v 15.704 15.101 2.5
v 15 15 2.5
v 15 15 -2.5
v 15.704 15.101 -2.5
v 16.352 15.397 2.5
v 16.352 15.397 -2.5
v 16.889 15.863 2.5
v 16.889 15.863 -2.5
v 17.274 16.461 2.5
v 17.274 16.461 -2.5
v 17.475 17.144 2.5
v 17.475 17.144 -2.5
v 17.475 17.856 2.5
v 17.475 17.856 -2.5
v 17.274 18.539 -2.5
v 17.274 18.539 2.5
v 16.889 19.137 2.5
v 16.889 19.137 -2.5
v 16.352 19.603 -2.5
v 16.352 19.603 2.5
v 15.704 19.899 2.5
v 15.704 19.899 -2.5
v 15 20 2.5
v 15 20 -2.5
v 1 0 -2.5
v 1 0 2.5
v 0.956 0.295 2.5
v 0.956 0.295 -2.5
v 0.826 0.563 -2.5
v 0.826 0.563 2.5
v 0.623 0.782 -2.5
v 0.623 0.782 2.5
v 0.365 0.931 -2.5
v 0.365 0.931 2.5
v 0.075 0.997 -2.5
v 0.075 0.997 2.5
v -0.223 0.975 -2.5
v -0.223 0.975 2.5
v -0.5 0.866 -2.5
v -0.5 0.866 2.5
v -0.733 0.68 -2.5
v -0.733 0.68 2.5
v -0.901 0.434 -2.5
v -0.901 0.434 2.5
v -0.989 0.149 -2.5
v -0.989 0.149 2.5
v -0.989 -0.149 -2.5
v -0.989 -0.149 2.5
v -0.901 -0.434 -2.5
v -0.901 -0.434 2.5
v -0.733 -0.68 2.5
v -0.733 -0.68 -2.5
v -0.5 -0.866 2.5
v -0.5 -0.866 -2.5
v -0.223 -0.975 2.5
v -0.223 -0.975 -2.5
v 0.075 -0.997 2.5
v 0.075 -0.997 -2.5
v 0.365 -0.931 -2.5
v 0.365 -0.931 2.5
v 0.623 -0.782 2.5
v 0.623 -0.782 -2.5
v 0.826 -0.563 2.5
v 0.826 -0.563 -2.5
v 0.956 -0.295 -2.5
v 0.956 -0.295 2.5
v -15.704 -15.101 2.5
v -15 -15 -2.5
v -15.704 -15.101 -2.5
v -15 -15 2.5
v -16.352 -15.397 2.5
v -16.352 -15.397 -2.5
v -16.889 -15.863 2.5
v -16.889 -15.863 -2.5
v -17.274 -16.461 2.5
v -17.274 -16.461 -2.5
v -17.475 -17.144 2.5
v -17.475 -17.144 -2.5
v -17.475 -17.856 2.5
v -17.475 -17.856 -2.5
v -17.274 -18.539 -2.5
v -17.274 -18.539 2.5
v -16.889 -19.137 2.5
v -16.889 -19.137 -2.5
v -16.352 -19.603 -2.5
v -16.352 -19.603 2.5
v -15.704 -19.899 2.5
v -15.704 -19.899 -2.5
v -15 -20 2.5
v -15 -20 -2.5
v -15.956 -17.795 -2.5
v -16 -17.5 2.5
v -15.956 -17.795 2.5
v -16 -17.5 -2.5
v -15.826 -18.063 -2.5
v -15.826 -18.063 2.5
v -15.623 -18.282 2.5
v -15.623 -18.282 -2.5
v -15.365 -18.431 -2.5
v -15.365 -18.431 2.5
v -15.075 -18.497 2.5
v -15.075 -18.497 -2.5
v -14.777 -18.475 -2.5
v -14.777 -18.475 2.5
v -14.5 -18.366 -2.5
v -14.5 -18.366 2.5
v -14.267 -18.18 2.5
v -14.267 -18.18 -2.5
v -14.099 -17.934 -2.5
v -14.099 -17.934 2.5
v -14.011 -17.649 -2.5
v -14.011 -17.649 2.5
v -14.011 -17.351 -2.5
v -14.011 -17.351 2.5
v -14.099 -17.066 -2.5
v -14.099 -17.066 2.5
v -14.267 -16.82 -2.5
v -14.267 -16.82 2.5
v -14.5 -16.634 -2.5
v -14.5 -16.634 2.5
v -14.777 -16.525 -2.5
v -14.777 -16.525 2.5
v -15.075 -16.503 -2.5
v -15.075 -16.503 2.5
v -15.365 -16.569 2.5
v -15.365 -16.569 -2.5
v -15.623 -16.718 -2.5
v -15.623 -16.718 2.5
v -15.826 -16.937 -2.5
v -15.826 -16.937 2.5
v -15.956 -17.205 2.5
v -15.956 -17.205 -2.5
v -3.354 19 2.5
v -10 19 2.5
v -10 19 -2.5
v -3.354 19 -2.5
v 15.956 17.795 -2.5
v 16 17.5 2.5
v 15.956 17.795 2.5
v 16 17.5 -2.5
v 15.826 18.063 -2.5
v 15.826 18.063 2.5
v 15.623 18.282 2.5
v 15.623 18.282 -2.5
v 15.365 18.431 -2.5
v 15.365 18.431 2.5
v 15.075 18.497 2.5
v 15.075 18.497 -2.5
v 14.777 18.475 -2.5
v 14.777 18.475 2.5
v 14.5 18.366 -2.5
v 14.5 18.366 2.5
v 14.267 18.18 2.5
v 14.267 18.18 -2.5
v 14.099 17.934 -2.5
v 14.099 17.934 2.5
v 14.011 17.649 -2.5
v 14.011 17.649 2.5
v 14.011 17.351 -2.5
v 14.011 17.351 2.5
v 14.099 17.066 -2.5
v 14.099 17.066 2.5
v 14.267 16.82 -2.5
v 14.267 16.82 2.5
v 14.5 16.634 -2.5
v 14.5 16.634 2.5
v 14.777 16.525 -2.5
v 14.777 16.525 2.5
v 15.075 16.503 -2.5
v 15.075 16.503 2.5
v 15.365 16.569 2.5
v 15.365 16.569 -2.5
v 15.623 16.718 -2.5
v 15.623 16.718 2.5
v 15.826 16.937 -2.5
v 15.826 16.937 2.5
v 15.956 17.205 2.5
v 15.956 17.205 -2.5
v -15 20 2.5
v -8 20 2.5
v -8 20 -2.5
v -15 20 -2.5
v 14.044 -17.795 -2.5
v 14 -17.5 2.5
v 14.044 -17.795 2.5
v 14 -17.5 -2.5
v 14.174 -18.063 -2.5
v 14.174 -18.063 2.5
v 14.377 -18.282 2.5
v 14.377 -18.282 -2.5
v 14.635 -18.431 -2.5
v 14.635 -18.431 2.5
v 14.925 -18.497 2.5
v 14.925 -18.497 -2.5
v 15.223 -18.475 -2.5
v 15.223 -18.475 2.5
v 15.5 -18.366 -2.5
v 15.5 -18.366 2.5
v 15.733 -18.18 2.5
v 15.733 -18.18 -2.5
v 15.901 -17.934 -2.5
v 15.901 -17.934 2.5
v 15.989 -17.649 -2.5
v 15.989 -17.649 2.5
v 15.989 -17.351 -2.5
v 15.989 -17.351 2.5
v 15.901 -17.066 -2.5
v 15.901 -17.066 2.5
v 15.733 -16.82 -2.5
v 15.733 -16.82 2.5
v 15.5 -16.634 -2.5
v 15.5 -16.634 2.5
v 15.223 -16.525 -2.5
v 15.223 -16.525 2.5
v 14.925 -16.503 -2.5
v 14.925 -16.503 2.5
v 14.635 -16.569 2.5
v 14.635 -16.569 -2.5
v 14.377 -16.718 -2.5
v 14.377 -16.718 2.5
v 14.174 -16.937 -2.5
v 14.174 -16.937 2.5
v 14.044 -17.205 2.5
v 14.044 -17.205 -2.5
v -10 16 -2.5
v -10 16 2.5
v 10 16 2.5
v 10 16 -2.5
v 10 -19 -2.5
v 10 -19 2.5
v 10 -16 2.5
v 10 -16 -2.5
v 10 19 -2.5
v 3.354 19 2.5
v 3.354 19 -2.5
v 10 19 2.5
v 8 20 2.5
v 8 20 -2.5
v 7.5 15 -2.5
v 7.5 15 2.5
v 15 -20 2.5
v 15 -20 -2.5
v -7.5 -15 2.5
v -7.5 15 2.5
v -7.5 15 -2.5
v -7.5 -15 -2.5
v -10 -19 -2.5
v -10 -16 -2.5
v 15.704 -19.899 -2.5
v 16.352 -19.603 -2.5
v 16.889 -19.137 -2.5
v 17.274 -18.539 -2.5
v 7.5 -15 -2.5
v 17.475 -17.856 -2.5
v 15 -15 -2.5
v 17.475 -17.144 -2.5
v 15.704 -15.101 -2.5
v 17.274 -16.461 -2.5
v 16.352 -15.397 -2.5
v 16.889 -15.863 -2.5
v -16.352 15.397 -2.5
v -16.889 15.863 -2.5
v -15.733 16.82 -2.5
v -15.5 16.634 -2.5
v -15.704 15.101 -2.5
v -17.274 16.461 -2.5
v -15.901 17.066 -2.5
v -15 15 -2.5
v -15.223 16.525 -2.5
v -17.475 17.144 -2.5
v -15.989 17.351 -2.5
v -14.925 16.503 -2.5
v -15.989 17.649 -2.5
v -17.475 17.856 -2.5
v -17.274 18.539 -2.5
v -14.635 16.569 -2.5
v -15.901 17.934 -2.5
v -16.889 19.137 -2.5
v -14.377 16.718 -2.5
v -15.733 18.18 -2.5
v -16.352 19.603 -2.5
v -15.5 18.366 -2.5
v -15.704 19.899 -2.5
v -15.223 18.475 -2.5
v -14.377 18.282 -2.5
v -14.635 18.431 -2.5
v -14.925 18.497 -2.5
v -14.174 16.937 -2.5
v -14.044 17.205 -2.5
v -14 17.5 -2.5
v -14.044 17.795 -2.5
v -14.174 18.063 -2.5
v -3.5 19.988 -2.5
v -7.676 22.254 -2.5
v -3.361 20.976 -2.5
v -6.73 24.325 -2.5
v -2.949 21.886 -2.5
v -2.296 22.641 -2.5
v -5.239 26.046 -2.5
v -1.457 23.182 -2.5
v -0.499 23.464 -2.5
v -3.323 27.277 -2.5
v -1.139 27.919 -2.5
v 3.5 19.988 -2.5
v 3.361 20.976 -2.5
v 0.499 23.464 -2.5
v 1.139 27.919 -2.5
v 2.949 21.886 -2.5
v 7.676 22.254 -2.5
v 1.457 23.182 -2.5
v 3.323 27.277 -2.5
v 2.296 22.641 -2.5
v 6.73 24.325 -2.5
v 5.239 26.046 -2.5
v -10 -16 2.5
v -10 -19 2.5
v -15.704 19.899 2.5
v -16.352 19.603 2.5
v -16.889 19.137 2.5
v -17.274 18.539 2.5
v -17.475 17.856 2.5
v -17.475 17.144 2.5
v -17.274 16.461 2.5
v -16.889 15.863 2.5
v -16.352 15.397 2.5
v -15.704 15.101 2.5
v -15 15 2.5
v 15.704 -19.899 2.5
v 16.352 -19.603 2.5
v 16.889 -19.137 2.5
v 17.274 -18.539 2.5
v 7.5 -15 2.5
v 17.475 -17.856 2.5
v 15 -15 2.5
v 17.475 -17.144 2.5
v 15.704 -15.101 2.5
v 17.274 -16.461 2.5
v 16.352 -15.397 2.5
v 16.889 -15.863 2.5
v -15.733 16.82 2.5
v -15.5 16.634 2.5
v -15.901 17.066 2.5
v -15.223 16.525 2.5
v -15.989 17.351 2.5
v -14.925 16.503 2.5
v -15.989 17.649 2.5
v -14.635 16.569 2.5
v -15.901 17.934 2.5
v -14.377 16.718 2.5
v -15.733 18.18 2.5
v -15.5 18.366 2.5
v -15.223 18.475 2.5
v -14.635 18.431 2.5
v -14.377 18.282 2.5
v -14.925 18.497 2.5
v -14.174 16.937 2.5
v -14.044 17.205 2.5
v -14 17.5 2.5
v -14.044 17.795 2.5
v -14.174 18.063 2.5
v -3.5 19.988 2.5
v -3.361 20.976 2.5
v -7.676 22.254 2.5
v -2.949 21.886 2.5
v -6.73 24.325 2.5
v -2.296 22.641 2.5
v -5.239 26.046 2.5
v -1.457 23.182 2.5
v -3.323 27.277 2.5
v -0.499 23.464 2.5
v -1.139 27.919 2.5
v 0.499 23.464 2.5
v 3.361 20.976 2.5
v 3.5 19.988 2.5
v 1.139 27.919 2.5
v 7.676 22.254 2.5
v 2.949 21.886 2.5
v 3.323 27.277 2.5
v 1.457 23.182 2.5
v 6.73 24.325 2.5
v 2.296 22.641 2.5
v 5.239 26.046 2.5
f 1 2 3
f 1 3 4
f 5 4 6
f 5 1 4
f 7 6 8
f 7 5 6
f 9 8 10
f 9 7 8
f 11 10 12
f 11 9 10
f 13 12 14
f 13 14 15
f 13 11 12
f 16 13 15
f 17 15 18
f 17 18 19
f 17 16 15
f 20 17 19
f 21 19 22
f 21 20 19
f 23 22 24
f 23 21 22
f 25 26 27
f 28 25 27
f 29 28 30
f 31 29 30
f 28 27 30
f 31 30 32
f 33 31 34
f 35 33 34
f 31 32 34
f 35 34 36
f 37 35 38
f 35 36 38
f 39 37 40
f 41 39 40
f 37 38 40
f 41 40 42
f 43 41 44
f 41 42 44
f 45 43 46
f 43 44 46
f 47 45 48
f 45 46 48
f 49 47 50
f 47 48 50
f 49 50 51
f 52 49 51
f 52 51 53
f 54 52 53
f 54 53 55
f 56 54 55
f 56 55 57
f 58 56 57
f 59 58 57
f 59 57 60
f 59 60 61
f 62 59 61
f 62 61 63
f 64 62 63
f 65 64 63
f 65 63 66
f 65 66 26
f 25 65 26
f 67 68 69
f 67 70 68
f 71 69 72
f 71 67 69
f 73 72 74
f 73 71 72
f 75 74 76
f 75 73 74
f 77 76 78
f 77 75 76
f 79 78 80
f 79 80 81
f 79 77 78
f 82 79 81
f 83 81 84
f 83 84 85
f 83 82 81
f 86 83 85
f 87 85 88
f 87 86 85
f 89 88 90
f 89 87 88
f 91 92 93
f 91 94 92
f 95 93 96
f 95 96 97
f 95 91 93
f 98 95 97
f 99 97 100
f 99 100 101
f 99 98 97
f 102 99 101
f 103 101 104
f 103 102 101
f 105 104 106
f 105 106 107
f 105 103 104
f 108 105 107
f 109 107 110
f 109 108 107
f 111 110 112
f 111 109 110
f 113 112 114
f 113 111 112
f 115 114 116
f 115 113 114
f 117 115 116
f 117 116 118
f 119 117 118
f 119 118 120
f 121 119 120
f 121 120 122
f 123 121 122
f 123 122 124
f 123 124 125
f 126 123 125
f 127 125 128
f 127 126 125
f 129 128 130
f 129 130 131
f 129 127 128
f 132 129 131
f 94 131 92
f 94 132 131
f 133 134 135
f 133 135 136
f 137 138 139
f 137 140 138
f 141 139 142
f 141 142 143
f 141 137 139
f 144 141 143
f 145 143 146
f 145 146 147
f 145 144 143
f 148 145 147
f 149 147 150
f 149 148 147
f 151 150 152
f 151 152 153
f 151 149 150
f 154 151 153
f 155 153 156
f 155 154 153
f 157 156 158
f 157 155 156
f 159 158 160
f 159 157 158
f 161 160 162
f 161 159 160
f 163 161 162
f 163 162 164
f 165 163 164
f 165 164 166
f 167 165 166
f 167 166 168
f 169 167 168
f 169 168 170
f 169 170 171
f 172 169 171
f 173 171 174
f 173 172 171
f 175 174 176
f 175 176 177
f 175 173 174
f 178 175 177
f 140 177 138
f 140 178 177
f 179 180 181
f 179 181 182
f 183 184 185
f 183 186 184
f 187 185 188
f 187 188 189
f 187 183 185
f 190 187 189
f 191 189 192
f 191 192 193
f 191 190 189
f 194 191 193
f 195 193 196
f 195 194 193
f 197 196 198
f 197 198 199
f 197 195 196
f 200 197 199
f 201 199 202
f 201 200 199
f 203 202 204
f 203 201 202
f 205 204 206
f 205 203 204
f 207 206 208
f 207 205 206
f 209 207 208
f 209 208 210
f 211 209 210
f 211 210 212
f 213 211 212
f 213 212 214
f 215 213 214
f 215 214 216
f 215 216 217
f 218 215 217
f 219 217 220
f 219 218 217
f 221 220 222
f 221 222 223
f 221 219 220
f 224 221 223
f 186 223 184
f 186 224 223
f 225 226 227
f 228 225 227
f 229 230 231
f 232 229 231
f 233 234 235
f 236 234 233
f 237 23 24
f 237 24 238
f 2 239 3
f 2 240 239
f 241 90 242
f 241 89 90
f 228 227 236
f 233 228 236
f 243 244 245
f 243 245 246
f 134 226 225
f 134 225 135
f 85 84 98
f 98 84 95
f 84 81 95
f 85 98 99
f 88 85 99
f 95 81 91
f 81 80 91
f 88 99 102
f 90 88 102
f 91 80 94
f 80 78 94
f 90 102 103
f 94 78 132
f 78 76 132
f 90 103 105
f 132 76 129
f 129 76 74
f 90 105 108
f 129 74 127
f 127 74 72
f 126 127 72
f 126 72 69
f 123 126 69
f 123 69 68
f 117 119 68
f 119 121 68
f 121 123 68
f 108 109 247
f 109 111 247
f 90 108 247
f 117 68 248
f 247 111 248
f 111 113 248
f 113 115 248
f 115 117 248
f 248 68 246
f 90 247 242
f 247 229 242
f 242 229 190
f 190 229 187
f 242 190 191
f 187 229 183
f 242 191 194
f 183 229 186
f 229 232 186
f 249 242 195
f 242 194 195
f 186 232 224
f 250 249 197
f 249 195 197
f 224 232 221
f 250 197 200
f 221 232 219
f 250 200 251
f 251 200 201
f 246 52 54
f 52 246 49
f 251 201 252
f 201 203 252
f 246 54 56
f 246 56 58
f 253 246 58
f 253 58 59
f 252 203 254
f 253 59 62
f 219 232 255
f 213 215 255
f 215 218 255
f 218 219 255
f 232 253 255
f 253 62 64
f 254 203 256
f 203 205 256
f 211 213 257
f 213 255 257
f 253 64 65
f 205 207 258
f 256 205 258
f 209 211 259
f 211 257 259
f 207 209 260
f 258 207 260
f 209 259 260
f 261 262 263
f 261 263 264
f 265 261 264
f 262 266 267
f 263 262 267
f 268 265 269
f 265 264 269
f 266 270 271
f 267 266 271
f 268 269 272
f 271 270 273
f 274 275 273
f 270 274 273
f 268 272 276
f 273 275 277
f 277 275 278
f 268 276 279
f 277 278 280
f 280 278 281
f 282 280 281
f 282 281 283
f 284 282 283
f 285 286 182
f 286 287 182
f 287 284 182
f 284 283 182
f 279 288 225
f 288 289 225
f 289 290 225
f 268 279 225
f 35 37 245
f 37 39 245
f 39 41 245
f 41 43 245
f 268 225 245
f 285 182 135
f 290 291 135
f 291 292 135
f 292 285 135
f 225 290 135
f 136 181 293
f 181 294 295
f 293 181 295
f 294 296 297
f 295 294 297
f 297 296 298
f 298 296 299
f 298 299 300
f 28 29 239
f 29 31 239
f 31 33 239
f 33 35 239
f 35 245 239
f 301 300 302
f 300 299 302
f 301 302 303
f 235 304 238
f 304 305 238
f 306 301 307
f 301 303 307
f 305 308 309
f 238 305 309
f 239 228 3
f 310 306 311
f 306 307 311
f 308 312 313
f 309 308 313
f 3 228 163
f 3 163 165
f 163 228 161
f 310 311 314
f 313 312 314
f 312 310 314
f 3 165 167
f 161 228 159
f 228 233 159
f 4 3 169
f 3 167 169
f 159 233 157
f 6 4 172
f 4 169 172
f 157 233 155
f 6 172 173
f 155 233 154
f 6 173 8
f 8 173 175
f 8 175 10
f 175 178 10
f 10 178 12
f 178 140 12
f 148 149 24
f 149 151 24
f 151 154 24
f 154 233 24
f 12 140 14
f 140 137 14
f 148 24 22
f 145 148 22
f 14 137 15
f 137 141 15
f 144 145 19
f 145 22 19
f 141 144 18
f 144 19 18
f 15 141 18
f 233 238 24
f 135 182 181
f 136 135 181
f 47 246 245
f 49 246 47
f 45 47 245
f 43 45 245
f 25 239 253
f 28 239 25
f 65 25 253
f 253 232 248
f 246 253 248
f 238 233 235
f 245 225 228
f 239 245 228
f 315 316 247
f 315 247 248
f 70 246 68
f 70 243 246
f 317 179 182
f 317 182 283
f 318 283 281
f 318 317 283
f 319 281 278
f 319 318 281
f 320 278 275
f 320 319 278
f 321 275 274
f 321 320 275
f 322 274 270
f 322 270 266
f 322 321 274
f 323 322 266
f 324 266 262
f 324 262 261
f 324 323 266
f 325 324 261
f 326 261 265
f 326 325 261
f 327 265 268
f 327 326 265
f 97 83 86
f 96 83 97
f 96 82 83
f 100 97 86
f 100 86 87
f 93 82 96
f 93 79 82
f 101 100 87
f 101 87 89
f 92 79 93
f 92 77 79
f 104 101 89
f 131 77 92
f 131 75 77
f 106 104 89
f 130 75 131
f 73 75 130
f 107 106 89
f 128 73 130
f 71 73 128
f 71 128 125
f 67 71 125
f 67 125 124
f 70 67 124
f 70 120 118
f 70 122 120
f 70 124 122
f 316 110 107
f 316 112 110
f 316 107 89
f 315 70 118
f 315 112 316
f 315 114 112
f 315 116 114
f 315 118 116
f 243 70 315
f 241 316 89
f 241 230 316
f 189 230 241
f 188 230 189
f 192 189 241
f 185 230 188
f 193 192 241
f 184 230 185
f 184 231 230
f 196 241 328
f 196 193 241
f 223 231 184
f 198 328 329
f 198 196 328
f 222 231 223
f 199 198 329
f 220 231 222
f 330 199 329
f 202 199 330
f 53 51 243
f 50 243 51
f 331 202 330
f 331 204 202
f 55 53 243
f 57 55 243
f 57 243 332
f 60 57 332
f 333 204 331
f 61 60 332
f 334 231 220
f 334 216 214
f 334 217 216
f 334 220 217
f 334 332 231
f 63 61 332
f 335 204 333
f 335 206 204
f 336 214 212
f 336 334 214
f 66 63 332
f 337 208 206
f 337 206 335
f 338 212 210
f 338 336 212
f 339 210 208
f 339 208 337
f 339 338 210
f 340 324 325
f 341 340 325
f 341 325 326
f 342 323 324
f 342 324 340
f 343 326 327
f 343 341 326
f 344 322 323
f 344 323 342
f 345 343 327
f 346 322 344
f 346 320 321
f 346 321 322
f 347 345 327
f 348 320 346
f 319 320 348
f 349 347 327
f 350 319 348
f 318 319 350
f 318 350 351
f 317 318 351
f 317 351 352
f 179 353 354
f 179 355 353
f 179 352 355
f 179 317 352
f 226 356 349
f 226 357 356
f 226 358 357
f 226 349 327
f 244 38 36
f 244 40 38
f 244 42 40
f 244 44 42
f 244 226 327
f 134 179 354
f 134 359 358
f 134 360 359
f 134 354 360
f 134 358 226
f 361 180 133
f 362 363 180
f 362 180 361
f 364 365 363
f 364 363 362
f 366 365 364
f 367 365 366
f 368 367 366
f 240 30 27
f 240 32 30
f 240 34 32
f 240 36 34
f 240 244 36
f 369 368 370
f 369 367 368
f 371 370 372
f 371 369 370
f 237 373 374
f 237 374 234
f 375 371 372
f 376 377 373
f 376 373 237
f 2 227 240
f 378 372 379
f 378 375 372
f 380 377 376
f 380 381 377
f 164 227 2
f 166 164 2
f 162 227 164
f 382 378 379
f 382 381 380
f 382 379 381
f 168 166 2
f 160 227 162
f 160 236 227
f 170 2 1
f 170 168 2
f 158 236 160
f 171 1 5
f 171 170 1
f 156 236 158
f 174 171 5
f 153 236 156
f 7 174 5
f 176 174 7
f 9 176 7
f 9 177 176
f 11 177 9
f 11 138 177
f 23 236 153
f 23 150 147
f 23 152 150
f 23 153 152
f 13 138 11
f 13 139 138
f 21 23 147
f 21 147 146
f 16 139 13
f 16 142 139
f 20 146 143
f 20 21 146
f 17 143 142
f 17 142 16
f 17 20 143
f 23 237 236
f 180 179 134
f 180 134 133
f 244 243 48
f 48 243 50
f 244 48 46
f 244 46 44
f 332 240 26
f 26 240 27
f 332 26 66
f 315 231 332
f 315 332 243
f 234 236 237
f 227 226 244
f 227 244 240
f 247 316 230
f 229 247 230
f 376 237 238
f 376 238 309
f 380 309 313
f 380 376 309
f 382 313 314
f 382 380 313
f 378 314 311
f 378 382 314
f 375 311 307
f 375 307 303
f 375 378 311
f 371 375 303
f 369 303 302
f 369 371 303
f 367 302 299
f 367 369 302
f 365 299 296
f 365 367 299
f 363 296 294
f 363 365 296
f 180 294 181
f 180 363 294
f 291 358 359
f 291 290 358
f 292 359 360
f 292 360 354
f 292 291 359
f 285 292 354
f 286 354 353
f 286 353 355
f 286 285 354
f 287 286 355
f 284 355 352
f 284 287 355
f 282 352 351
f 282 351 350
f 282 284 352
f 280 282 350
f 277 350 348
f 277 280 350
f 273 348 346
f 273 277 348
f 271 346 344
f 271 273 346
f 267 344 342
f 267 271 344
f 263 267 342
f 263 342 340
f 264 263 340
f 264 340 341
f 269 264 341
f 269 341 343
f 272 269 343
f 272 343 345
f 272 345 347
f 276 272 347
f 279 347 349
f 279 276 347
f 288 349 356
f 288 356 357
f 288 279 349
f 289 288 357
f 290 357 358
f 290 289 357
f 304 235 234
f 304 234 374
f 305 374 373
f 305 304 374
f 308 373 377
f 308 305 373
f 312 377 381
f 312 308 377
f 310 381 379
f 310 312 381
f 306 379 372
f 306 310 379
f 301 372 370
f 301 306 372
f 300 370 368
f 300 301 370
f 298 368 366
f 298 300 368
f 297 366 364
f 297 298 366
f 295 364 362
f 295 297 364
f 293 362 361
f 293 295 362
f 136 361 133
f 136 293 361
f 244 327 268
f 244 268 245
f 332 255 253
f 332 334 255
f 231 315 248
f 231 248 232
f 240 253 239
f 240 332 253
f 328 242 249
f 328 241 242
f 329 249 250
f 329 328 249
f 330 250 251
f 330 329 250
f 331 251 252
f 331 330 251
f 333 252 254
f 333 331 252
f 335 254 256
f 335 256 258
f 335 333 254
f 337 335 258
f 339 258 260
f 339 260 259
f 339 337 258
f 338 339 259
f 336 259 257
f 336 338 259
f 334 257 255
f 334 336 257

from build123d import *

# Parameters (mm, degrees)
SKETCH1_R           = 1
SKETCH1_R_2         = 3.5
BOSS_EXTRUDE2_DEPTH = 2.5
SKETCH2_R           = 1
SKETCH2_W           = 20
SKETCH2_H           = 3
CUT_EXTRUDE1_DEPTH  = 34.395358959


with BuildPart() as part:
    # Sketch1 → Boss-Extrude2 (new, symmetric)
    with BuildSketch(Plane.XY):
        with BuildLine():
            Line((7.5, 15), (15, 15))
            ThreePointArc((15, 15), (17.5, 17.5), (15, 20))
            Line((15, 20), (8, 20))
            ThreePointArc((8, 20), (0, 28), (-8, 20))
            Line((-8, 20), (-15, 20))
            ThreePointArc((-15, 20), (-17.5, 17.5), (-15, 15))
            Line((-15, 15), (-7.5, 15))
            Line((-7.5, 15), (-7.5, -15))
            Line((-7.5, -15), (-15, -15))
            ThreePointArc((-15, -15), (-17.5, -17.5), (-15, -20))
            Line((-15, -20), (15, -20))
            ThreePointArc((15, -20), (17.5, -17.5), (15, -15))
            Line((15, -15), (7.5, -15))
            Line((7.5, -15), (7.5, 15))
        make_face()
        with Locations((-15, 17.5)):
            Circle(SKETCH1_R, mode=Mode.SUBTRACT)
        with Locations((15, 17.5)):
            Circle(SKETCH1_R, mode=Mode.SUBTRACT)
        with Locations(Location((15, -17.5, 0), (0, 0, 180))):
            Circle(SKETCH1_R, mode=Mode.SUBTRACT)
        with Locations(Location((-15, -17.5, 0), (0, 0, 180))):
            Circle(SKETCH1_R, mode=Mode.SUBTRACT)
        with Locations((0, 20)):
            Circle(SKETCH1_R_2, mode=Mode.SUBTRACT)
    extrude(amount=BOSS_EXTRUDE2_DEPTH, both=True)

    # Sketch2 → Cut-Extrude1 (cut, through all)
    with BuildSketch(Plane.XY.offset(2.5)):
        Circle(SKETCH2_R)
        with Locations((0, 17.5)):
            Rectangle(SKETCH2_W, SKETCH2_H)
        with Locations((0, -17.5)):
            Rectangle(SKETCH2_W, SKETCH2_H)
    extrude(amount=-CUT_EXTRUDE1_DEPTH, mode=Mode.SUBTRACT)


solid = part.part
